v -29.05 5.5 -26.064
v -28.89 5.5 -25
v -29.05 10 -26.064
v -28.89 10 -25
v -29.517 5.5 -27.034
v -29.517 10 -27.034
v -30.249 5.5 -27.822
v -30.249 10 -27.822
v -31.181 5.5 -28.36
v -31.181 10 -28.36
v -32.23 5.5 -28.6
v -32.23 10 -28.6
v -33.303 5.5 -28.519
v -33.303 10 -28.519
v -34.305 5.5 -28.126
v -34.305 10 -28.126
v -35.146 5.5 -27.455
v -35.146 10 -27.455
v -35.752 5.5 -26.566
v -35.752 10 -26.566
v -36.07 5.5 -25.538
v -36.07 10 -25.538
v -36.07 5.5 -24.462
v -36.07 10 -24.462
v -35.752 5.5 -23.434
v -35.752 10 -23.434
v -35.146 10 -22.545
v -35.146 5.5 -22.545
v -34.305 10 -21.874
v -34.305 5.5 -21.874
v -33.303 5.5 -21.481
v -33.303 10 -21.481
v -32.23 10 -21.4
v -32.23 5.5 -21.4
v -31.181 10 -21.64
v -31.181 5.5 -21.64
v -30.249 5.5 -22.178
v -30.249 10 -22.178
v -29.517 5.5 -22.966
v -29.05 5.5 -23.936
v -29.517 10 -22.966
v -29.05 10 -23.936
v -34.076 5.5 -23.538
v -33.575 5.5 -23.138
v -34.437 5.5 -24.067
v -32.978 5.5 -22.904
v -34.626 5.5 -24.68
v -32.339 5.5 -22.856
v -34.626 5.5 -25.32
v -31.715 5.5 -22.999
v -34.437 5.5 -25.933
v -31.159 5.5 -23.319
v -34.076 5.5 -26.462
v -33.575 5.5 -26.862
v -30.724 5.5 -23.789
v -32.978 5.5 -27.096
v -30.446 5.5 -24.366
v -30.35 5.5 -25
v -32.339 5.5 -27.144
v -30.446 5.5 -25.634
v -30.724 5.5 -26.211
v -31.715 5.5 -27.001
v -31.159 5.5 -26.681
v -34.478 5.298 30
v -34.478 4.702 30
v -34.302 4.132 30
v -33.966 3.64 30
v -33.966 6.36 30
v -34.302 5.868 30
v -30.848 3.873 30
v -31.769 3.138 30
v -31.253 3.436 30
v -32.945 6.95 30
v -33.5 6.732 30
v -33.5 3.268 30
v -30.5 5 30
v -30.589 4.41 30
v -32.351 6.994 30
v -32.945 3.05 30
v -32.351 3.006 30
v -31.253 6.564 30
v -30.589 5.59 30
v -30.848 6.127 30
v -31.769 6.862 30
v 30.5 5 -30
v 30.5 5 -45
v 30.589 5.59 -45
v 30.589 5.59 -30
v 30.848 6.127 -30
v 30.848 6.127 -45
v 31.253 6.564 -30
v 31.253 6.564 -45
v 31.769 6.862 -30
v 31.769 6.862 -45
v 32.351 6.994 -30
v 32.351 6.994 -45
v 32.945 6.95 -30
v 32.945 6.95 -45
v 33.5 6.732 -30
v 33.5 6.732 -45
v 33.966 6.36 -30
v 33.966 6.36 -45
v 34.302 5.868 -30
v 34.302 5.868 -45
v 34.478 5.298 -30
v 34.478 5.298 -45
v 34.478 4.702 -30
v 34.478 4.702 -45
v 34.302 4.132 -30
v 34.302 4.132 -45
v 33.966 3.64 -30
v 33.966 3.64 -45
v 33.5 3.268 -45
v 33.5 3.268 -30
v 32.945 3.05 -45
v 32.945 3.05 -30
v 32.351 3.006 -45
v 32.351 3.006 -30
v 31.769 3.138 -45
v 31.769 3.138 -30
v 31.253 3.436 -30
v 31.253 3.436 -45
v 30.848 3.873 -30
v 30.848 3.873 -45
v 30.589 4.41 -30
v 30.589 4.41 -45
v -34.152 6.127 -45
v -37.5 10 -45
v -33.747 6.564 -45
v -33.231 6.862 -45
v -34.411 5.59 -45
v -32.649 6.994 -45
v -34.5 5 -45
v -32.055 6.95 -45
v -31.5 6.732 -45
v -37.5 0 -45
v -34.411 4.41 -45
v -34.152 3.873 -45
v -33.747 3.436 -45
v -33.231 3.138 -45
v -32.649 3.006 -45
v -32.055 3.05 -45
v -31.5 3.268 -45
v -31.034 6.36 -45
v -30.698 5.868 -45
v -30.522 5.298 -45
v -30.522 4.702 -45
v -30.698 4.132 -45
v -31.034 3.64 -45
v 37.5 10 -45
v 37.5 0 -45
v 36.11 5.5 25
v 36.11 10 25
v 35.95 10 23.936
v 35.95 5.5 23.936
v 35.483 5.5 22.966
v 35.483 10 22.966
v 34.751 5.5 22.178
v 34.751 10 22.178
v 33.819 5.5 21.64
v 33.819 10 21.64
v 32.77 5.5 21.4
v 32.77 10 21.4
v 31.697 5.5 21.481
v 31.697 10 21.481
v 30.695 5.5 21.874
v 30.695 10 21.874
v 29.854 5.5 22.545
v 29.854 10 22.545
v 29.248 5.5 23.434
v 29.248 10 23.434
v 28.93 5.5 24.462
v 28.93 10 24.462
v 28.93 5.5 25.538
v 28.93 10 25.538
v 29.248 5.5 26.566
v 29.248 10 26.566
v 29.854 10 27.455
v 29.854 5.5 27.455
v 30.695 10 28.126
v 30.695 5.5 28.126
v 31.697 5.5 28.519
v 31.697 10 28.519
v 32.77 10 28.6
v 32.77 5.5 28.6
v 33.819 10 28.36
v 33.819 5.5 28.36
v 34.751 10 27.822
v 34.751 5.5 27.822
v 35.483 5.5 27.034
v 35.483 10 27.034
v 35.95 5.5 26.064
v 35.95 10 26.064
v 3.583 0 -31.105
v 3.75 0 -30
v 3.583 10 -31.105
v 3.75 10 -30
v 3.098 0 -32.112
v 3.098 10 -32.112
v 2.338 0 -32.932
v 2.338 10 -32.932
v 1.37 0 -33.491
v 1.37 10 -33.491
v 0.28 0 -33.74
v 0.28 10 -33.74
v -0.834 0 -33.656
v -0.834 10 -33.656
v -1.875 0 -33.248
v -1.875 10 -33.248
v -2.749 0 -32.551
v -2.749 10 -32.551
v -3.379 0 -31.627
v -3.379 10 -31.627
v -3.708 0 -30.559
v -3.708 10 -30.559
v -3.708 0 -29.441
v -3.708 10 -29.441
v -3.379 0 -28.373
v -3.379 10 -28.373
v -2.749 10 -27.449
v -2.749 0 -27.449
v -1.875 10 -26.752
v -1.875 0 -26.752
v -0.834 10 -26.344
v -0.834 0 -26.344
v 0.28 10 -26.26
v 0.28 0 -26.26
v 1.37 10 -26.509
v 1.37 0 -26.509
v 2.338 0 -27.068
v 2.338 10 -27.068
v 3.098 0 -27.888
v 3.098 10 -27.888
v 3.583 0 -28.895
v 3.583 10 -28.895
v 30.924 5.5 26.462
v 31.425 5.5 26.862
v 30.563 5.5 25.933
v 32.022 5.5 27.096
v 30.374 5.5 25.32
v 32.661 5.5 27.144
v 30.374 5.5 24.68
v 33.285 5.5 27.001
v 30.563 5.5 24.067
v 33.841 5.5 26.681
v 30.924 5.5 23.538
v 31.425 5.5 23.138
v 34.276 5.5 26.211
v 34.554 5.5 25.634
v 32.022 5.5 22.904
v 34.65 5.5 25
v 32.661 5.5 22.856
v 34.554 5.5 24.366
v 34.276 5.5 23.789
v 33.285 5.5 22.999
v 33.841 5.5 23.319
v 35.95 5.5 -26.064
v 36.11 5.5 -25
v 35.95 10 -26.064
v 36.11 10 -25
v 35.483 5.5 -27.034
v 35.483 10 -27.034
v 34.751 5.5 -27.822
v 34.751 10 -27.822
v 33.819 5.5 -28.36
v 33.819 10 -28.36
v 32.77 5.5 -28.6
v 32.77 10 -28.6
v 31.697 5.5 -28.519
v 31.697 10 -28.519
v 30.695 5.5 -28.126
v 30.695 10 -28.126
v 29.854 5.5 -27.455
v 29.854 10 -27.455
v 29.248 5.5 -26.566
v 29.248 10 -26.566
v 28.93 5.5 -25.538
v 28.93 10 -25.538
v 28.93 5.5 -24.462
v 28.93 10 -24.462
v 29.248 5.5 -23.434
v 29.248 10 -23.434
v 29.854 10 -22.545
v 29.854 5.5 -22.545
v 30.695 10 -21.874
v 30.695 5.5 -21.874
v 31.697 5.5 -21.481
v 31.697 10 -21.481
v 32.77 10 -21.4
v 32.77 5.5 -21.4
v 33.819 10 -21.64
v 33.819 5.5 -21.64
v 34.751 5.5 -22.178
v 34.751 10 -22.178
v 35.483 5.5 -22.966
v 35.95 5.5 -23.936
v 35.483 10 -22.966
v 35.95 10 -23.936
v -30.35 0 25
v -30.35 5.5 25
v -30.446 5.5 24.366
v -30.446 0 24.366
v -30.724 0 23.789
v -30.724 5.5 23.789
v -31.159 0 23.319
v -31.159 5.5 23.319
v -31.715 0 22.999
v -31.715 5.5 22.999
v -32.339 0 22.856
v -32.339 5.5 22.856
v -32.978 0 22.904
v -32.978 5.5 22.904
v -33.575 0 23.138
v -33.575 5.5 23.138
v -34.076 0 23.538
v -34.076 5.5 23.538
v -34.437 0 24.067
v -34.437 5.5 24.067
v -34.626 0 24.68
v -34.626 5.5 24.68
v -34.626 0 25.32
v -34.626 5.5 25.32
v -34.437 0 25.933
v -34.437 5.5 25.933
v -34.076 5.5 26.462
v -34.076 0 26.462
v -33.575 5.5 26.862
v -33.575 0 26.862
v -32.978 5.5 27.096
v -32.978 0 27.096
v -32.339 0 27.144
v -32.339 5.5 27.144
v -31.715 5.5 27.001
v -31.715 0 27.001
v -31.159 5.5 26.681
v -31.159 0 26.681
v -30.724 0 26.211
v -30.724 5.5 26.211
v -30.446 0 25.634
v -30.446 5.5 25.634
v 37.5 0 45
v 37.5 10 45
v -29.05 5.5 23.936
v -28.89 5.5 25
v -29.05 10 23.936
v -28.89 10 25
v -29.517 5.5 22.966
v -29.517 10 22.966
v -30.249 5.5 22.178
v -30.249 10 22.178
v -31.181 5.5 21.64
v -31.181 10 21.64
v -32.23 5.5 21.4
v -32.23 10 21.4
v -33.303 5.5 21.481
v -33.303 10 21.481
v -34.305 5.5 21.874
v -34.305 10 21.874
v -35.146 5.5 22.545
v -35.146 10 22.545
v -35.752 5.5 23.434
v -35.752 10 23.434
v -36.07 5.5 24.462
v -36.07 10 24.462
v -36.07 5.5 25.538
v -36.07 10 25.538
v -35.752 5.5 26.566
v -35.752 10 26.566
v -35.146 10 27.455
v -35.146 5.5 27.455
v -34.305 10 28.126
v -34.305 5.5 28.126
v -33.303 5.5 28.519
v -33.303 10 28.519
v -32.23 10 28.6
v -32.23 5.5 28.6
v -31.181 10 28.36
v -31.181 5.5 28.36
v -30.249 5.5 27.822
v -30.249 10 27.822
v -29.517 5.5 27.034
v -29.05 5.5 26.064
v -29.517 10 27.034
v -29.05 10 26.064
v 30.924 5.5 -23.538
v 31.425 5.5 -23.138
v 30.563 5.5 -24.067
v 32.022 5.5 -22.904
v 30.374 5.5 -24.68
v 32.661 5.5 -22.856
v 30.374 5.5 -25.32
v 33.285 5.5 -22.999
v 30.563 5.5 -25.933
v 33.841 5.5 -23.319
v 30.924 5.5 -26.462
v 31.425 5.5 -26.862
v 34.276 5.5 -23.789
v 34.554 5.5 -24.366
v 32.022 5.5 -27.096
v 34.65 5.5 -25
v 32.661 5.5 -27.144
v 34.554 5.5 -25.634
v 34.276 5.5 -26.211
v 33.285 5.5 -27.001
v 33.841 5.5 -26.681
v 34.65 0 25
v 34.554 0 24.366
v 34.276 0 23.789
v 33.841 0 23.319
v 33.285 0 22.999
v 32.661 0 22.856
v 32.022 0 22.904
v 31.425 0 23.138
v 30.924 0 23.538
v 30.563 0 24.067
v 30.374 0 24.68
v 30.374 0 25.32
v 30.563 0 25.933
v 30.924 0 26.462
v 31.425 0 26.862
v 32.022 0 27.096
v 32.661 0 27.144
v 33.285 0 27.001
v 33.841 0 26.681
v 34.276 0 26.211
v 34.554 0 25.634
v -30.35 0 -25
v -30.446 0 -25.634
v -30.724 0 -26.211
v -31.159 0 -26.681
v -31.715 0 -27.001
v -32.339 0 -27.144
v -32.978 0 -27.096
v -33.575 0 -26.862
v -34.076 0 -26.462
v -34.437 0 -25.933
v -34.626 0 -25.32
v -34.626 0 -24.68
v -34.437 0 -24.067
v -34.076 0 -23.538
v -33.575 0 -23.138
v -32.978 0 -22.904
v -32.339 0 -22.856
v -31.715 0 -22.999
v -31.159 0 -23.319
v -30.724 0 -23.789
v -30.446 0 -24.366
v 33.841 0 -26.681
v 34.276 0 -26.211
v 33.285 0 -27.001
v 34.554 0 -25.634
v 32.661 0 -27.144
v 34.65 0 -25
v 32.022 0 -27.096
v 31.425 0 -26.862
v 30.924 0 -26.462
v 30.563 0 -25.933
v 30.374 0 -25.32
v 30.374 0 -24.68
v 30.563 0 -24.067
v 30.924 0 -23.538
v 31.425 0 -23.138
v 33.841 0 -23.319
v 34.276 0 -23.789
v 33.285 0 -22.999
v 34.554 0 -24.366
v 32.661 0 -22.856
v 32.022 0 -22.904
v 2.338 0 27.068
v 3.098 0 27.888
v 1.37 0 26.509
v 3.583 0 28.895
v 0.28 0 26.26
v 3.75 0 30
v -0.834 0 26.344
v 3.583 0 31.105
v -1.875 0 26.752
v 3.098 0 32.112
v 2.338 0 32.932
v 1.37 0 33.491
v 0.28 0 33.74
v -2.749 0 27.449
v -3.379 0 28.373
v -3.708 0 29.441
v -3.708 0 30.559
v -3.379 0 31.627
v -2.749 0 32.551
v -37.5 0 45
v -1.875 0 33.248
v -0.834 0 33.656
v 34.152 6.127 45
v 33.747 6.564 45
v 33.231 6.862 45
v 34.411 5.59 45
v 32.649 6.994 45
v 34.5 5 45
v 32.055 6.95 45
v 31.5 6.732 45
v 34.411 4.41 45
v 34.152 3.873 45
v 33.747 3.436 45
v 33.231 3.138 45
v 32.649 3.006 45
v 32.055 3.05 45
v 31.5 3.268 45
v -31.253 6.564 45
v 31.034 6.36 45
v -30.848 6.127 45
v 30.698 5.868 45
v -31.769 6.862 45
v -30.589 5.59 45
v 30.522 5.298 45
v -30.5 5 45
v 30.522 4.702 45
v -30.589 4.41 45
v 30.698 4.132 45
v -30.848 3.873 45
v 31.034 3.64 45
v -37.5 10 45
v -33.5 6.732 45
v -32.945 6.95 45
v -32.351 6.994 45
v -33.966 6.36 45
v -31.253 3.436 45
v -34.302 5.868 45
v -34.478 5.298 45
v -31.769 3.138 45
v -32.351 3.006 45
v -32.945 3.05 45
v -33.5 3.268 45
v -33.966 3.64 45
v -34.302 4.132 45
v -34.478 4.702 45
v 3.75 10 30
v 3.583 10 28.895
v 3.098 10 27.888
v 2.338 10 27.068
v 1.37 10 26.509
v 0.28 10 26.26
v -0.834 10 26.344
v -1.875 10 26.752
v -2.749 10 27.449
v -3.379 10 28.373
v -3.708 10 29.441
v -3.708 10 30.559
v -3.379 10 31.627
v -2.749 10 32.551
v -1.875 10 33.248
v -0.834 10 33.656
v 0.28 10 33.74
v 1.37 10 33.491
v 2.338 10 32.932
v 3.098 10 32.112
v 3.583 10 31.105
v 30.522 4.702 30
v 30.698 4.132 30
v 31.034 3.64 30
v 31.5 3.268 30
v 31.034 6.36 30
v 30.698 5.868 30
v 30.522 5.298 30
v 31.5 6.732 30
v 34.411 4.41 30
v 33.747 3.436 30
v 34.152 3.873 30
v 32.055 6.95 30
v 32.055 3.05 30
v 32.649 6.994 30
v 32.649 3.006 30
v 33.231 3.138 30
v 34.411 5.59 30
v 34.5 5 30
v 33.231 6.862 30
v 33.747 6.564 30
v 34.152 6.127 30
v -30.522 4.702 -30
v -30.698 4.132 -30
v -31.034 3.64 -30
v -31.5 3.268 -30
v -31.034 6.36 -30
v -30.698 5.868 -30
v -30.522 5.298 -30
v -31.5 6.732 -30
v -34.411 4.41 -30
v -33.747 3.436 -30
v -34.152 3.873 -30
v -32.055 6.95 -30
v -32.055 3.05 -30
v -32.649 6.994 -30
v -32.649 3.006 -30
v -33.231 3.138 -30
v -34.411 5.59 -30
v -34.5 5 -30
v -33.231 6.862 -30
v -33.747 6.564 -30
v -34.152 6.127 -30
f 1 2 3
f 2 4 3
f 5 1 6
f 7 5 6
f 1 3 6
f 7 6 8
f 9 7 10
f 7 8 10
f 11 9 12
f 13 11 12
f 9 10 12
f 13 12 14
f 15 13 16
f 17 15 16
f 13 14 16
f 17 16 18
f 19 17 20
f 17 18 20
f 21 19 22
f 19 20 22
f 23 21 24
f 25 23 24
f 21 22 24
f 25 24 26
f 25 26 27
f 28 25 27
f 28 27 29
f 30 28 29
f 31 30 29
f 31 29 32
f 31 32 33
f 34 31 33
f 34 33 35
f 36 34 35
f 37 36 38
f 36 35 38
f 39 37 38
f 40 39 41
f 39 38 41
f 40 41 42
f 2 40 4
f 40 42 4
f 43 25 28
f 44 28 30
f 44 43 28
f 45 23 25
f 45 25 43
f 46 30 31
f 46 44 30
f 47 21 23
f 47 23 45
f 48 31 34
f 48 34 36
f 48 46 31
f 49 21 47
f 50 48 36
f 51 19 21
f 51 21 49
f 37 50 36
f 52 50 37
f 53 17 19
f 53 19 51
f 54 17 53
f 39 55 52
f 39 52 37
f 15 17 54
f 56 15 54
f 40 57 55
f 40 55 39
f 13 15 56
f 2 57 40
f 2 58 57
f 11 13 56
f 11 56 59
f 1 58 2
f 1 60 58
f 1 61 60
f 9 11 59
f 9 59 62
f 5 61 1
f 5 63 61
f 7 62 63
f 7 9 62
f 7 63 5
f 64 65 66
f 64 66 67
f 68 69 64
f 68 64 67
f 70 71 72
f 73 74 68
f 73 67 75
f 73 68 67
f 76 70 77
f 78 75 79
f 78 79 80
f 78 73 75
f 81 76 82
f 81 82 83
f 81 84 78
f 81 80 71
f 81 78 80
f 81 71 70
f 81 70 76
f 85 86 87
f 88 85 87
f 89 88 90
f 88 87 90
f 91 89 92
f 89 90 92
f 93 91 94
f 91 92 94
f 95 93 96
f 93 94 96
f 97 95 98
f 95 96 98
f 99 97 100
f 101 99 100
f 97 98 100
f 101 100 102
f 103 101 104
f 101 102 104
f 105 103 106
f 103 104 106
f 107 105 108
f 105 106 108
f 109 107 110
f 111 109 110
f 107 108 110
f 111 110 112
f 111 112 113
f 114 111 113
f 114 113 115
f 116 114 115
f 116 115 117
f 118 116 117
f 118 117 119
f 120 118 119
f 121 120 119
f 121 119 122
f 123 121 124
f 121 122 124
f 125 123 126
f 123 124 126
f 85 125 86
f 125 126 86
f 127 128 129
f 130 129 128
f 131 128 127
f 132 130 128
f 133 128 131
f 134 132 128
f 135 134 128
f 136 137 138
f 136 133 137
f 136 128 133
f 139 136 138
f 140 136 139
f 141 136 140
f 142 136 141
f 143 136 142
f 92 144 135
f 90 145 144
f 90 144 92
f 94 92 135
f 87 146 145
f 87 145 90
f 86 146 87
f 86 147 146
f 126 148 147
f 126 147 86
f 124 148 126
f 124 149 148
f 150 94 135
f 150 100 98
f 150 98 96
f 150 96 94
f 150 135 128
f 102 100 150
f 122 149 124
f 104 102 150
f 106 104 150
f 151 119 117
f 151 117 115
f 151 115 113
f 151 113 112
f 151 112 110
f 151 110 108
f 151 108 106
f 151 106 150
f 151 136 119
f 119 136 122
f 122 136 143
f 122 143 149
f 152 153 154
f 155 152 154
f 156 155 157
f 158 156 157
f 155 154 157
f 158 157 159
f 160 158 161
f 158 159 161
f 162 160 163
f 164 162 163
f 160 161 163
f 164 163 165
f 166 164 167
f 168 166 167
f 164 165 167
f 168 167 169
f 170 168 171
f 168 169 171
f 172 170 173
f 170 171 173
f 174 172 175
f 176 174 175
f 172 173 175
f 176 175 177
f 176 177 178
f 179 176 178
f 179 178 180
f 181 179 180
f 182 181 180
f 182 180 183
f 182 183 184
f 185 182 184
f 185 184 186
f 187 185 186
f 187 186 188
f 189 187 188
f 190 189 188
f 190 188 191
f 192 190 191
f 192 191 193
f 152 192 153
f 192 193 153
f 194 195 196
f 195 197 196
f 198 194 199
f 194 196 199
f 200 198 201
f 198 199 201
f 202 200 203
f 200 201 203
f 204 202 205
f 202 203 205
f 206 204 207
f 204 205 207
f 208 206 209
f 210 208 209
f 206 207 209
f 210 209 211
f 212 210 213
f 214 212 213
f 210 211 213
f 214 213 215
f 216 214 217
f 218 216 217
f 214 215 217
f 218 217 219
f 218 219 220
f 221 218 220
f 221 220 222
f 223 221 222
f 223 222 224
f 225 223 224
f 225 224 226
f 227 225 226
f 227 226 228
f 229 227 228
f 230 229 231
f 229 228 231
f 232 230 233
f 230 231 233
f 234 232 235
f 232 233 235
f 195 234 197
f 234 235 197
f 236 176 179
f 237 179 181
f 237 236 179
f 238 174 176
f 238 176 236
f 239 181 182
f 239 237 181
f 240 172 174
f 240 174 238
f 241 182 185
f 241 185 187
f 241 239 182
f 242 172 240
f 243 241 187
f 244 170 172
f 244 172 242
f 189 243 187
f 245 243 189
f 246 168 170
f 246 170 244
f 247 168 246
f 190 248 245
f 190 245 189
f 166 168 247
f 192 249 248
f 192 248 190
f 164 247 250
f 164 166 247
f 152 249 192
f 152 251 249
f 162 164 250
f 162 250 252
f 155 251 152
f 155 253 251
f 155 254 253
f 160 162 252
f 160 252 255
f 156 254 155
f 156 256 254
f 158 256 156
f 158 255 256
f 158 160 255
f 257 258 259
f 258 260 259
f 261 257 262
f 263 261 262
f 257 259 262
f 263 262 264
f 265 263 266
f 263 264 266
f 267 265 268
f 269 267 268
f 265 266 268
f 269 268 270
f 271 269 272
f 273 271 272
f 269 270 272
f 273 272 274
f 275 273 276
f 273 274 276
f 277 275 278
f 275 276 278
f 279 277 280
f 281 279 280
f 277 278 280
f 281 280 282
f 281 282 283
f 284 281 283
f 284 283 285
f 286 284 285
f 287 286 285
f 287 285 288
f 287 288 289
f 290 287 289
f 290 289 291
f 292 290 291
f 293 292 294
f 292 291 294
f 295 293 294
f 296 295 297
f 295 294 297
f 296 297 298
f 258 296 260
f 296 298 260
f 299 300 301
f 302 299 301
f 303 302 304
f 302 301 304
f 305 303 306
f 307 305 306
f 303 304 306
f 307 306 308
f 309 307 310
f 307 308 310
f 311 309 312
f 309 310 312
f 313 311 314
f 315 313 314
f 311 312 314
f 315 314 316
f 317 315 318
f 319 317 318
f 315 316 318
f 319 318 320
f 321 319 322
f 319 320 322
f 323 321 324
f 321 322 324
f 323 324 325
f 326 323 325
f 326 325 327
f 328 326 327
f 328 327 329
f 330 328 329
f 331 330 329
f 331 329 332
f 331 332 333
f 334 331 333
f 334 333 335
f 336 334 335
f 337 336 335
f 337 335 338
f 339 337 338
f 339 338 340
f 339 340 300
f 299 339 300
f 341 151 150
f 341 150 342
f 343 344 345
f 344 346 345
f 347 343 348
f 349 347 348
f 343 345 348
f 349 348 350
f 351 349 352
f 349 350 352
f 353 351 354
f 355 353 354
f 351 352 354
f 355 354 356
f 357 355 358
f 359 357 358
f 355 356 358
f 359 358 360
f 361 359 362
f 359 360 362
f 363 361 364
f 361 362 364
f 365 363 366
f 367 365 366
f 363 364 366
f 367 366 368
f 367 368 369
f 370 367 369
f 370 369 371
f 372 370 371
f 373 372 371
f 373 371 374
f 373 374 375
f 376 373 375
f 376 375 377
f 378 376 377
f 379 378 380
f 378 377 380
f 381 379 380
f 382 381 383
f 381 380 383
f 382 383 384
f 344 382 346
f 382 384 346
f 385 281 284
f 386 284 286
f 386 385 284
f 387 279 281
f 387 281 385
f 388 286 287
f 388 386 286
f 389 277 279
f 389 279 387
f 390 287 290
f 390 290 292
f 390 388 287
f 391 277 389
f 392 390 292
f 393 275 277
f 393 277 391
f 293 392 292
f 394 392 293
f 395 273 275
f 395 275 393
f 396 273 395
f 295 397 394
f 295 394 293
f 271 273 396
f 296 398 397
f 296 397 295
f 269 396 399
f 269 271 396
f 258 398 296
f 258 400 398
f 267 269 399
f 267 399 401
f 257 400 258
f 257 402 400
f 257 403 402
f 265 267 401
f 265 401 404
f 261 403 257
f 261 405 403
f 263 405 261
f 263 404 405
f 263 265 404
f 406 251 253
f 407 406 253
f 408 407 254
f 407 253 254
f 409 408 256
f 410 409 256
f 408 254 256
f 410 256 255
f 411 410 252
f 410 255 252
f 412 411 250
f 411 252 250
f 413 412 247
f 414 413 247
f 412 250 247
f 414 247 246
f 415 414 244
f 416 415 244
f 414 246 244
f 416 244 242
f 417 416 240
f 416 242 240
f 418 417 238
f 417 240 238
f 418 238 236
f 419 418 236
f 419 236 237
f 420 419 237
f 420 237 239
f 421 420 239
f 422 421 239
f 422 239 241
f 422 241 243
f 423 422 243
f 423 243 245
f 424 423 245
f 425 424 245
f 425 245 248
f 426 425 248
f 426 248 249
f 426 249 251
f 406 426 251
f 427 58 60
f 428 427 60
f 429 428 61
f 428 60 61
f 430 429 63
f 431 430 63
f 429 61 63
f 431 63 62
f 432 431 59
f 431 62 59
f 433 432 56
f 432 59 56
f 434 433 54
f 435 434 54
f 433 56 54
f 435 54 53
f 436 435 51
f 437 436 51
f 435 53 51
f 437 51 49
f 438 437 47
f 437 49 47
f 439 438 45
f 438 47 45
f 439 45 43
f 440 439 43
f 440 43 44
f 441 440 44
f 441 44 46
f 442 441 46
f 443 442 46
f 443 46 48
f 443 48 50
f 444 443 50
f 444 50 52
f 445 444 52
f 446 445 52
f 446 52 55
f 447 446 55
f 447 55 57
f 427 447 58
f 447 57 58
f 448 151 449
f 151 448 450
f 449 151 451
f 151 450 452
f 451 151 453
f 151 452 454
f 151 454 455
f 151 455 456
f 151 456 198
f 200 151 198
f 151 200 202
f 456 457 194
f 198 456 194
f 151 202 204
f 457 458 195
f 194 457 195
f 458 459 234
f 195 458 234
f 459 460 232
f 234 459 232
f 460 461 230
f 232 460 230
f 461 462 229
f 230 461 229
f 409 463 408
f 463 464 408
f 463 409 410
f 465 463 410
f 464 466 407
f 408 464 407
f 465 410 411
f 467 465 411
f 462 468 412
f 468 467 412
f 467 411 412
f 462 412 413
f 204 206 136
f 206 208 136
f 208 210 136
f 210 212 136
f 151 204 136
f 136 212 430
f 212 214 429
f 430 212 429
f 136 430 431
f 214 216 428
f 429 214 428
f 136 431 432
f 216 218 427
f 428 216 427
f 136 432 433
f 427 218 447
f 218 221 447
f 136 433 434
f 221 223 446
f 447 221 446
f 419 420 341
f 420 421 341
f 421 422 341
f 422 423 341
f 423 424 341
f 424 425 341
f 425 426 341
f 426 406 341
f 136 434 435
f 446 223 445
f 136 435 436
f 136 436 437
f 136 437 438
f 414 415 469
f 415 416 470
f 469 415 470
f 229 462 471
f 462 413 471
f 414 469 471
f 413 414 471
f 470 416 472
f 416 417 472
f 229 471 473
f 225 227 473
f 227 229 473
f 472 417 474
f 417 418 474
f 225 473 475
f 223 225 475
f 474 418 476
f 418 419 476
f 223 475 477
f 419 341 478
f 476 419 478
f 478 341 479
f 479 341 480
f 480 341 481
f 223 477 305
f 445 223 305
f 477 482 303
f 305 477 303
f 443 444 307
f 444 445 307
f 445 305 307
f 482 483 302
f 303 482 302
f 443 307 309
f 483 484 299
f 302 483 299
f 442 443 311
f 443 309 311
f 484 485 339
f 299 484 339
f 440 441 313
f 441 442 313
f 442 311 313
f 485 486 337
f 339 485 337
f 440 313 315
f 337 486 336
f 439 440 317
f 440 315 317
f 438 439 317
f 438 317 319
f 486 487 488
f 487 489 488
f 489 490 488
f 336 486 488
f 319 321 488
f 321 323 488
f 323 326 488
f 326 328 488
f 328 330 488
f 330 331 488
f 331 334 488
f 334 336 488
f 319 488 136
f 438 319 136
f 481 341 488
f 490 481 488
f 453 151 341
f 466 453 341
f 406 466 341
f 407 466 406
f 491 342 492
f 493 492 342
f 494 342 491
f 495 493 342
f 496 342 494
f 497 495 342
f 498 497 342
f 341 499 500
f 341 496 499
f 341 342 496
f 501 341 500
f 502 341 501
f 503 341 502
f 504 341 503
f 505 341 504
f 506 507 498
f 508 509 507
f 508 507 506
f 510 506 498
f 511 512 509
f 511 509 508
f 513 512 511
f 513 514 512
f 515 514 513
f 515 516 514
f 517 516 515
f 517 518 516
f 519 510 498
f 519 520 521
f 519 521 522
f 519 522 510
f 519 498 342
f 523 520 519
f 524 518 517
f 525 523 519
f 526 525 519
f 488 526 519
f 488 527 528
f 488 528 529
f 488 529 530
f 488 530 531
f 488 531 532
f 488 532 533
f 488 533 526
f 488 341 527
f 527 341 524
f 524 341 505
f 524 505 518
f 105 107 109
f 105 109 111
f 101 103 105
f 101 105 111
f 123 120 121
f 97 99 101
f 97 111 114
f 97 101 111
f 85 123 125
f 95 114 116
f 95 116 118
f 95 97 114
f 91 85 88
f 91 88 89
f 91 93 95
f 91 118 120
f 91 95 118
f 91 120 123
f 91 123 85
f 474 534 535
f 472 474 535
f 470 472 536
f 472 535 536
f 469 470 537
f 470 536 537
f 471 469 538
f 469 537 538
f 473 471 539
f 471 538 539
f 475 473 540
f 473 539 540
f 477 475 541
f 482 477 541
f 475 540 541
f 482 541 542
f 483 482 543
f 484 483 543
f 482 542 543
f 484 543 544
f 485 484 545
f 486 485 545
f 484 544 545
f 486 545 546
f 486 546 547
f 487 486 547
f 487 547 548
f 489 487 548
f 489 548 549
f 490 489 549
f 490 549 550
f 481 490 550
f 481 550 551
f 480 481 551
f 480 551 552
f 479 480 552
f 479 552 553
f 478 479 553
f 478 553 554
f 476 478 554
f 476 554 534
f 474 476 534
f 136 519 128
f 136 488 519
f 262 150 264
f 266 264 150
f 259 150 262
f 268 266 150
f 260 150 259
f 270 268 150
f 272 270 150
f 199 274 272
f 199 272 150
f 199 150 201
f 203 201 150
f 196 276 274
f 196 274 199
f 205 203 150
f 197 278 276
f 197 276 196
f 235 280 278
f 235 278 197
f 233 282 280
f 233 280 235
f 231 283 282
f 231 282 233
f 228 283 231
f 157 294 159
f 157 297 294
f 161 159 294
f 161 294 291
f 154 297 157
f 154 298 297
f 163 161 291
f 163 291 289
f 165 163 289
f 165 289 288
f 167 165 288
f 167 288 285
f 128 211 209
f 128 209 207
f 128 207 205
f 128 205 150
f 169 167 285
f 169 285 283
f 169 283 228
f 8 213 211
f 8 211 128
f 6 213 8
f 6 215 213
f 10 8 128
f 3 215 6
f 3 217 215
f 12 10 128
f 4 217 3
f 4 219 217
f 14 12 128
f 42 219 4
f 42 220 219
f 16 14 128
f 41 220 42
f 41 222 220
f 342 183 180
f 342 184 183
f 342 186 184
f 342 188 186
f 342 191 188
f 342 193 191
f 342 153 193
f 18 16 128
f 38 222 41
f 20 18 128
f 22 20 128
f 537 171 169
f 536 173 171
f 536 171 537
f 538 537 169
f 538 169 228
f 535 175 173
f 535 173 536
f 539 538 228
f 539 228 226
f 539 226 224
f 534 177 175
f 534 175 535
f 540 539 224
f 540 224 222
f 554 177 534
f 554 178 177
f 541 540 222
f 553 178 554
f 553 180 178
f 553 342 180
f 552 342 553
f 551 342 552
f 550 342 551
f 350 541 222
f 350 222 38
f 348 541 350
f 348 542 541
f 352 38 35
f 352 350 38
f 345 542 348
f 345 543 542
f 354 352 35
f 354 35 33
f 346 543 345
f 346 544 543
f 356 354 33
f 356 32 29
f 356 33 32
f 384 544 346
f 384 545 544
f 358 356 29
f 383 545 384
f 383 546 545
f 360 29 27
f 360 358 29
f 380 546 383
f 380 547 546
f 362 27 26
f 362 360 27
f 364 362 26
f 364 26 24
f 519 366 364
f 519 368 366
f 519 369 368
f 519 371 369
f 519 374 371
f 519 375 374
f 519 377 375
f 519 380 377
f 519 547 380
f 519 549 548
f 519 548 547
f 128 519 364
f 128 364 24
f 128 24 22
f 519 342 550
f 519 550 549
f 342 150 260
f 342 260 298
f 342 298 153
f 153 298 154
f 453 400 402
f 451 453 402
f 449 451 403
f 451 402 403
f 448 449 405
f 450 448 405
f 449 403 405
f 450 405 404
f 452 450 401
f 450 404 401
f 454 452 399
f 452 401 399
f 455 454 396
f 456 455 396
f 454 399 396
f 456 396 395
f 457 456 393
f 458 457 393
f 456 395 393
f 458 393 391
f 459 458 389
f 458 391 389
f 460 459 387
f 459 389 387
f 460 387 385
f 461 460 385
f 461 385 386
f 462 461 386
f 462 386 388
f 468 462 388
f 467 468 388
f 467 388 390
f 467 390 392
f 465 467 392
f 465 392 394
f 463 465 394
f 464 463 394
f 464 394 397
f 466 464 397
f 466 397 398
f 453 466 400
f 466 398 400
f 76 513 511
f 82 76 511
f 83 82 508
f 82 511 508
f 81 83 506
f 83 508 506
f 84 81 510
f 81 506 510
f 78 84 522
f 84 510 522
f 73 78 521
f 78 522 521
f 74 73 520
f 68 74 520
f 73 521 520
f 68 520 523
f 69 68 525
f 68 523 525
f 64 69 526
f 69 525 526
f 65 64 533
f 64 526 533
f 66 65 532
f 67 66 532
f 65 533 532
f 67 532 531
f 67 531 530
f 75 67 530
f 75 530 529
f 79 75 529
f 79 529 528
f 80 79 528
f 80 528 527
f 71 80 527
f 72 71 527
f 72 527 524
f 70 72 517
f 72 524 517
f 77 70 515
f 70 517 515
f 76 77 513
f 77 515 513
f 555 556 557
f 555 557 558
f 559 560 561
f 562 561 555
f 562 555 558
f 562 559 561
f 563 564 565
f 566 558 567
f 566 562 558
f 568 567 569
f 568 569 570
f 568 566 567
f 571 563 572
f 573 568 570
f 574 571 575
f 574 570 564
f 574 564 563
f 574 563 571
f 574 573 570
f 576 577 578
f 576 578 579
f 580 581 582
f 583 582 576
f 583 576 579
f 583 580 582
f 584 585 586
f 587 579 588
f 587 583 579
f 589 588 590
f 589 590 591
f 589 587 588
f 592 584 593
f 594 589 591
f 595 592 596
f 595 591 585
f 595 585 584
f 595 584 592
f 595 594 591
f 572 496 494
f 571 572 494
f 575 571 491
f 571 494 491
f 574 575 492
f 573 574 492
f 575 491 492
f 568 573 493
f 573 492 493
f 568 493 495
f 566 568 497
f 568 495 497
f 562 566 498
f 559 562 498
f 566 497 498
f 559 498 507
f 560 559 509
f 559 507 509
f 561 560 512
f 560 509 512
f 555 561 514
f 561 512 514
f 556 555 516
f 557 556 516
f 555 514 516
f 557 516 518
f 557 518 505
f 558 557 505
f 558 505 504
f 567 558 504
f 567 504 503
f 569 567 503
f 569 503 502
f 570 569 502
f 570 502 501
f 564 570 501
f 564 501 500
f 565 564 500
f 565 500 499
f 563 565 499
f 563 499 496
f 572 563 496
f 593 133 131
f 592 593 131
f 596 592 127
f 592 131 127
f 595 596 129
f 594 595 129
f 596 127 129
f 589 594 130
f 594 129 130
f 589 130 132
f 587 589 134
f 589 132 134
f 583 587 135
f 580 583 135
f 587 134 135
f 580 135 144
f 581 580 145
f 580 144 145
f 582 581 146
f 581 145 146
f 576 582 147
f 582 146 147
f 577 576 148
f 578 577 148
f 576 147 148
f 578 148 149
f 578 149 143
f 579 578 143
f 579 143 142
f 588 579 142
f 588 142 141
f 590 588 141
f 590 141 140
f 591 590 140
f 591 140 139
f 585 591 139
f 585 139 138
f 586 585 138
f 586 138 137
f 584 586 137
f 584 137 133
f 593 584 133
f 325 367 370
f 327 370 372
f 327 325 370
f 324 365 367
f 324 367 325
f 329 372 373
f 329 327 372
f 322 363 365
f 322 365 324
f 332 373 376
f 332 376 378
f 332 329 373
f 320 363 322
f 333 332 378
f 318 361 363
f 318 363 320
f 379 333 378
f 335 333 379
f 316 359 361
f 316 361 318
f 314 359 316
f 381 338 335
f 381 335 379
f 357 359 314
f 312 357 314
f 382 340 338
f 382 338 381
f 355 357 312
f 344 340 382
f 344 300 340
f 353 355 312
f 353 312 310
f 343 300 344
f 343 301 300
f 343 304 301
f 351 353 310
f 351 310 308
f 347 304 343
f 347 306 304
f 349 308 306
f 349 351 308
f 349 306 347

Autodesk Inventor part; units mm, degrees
ref_plane "YZ Plane" through (0, 0, 0) normal (1, 0, 0) x (0, 1, 0)
ref_plane "XZ Plane" through (0, 0, 0) normal (0, 1, 0) x (-1, 0, 0)
ref_plane "XY Plane" through (0, 0, 0) normal (0, 0, 1) x (1, 0, 0)
sketch "Sketch1" plane through (0, 0, 0) normal (0, 1, 0) x (-1, 0, 0)
  line L0 (-37.5, 45) -> (37.5, 45)
  line L1 (37.5, 45) -> (37.5, -45)
  line L2 (37.5, -45) -> (-37.5, -45)
  line L3 (-37.5, -45) -> (-37.5, 45)
  line L4 (-37.5, 45) -> (37.5, -45) construction
  line L5 (37.5, 45) -> (-37.5, -45) construction
  point P0 (0, 0)
  dimension "d0" = 75
  dimension "d1" = 90
extrude "Extrusion1" add sketch "Sketch1" along normal blind 10
sketch "Sketch2" plane through (0, 10, 0) normal (0, 1, 0) x (1, 0, 0)
  line L0 (-37.5, -45) -> (37.5, -45) projected
  line L1 (37.5, -45) -> (37.5, -25)
  line L2 (37.5, -45) -> (37.5, 45) projected
  line L3 (37.5, -25) -> (32.5, -25)
  circle A0 centre (32.5, -25) radius 2.15
  line L4 (0, 0) -> (37.5, 0)
  line L5 (-37.5, 45) -> (37.5, 45)
  line L6 (37.5, 45) -> (37.5, 25)
  line L7 (37.5, 45) -> (37.5, -45)
  line L8 (37.5, 25) -> (32.5, 25)
  circle A1 centre (32.5, 25) radius 2.15
  line L9 (0, -45) -> (0, 45)
  line L10 (-37.5, -45) -> (-37.5, -25)
  line L11 (-37.5, -45) -> (-37.5, 45)
  line L12 (-37.5, -25) -> (-32.5, -25)
  circle A2 centre (-32.5, -25) radius 2.15
  line L13 (-37.5, 45) -> (-37.5, 25)
  line L14 (-37.5, 45) -> (-37.5, -45)
  line L15 (-37.5, 25) -> (-32.5, 25)
  circle A3 centre (-32.5, 25) radius 2.15
  point P0 (-37.5, 0)
  dimension "d4" = 20
  dimension "d5" = 5
  dimension "d6" = 4.3
extrude "Extrusion2" cut sketch "Sketch2" against normal blind 10 contours A3 | A2 | A0 | A1
sketch "Sketch3" plane through (0, 10, 0) normal (0, 1, 0) x (1, 0, 0)
  circle A0 centre (32.5, -25) radius 3.61
  circle A1 centre (32.5, -25) radius 2.15 projected
  line L0 (0, 0) -> (29.9913, 0)
  line L1 (-37.5, -45) -> (37.5, -45) projected
  line L2 (0, -45) -> (0, 45)
  circle A2 centre (32.5, -25) radius 2
  circle A3 centre (32.5, 25) radius 3.61
  circle A4 centre (32.5, 25) radius 2.15
  circle A5 centre (32.5, 25) radius 2
  circle A6 centre (-32.5, -25) radius 3.61
  circle A7 centre (-32.5, -25) radius 2.15
  circle A8 centre (-32.5, -25) radius 2
  circle A9 centre (-32.5, 25) radius 3.61
  circle A10 centre (-32.5, 25) radius 2.15
  circle A11 centre (-32.5, 25) radius 2
  point P0 (-29.9913, 0)
  dimension "d11" = 7.22
  dimension "d14" = 4
extrude "Extrusion3" cut sketch "Sketch3" against normal blind 4.5 contours A0 | A3 | A6 | A9
sketch "Sketch4" plane through (0, 10, 0) normal (0, 1, 0) x (1, 0, 0)
  line L0 (-37.5, -45) -> (37.5, -45) projected
  line L1 (37.5, -45) -> (0, -45)
  line L2 (0, -45) -> (0, -30)
  circle A0 centre (0, -30) radius 3.75
  line L3 (37.5, 45) -> (-37.5, 45) projected
  line L4 (-37.5, 45) -> (0, 45)
  line L5 (0, 45) -> (0, 30)
  circle A1 centre (0, 30) radius 3.75
  point P0 (0, 0)
  dimension "d17" = 37.5
  dimension "d18" = 15
  dimension "d19" = 7.5
  dimension "d22" = 37.5
  dimension "d23" = 15
  dimension "d24" = 7.5
extrude "Extrusion5" cut sketch "Sketch4" against normal blind 10
sketch "Sketch7" plane through (0, 10, 0) normal (0, 1, 0) x (1, 0, 0)
  circle A0 centre (0, 30) radius 3.75 projected
sketch "Sketch8" plane through (0, 10, 0) normal (0, 1, 0) x (1, 0, 0)
  circle A0 centre (0, -30) radius 3.75 projected
sketch "Sketch9" plane through (-37.5, 0, 45) normal (0, 0, 1) x (1, 0, 0)
  line L0 (0, 0) -> (0, 10) projected
  line L1 (0, 5) -> (5, 5)
  circle A0 centre (5, 5) radius 2
  line L2 (75, 0) -> (75, 10) projected
  line L3 (75, 5) -> (70, 5)
  circle A1 centre (70, 5) radius 2
  point P0 (37.5, 0)
  dimension "d28" = 5
  dimension "d29" = 4
  dimension "d30" = 5
  dimension "d31" = 4
sketch "Sketch10" plane through (37.5, 0, -45) normal (0, 0, -1) x (-1, 0, 0)
  line L0 (0, 0) -> (0, 10) projected
  line L1 (0, 5) -> (5, 5)
  line L2 (75, 0) -> (75, 10) projected
  line L3 (75, 5) -> (70, 5)
  circle A0 centre (5, 5) radius 2
  circle A1 centre (70, 5) radius 2
  point P0 (37.5, 0)
  dimension "d32" = 5
  dimension "d33" = 5
  dimension "d34" = 4
  dimension "d35" = 4
extrude "Extrusion6" cut sketch "Sketch10" against normal blind 15
extrude "Extrusion7" cut sketch "Sketch9" against normal blind 15
thread "Thread1" size "M4x0.7" class "6H" standard "ANSI Metric M Profile" full length
thread "Thread2" size "M4x0.7" class "6H" standard "ANSI Metric M Profile" full length
thread "Thread3" size "M4x0.7" class "6H" standard "ANSI Metric M Profile" full length
thread "Thread4" size "M4x0.7" class "6H" standard "ANSI Metric M Profile" full length
properties part number "Rb PEEK - Arriba"
